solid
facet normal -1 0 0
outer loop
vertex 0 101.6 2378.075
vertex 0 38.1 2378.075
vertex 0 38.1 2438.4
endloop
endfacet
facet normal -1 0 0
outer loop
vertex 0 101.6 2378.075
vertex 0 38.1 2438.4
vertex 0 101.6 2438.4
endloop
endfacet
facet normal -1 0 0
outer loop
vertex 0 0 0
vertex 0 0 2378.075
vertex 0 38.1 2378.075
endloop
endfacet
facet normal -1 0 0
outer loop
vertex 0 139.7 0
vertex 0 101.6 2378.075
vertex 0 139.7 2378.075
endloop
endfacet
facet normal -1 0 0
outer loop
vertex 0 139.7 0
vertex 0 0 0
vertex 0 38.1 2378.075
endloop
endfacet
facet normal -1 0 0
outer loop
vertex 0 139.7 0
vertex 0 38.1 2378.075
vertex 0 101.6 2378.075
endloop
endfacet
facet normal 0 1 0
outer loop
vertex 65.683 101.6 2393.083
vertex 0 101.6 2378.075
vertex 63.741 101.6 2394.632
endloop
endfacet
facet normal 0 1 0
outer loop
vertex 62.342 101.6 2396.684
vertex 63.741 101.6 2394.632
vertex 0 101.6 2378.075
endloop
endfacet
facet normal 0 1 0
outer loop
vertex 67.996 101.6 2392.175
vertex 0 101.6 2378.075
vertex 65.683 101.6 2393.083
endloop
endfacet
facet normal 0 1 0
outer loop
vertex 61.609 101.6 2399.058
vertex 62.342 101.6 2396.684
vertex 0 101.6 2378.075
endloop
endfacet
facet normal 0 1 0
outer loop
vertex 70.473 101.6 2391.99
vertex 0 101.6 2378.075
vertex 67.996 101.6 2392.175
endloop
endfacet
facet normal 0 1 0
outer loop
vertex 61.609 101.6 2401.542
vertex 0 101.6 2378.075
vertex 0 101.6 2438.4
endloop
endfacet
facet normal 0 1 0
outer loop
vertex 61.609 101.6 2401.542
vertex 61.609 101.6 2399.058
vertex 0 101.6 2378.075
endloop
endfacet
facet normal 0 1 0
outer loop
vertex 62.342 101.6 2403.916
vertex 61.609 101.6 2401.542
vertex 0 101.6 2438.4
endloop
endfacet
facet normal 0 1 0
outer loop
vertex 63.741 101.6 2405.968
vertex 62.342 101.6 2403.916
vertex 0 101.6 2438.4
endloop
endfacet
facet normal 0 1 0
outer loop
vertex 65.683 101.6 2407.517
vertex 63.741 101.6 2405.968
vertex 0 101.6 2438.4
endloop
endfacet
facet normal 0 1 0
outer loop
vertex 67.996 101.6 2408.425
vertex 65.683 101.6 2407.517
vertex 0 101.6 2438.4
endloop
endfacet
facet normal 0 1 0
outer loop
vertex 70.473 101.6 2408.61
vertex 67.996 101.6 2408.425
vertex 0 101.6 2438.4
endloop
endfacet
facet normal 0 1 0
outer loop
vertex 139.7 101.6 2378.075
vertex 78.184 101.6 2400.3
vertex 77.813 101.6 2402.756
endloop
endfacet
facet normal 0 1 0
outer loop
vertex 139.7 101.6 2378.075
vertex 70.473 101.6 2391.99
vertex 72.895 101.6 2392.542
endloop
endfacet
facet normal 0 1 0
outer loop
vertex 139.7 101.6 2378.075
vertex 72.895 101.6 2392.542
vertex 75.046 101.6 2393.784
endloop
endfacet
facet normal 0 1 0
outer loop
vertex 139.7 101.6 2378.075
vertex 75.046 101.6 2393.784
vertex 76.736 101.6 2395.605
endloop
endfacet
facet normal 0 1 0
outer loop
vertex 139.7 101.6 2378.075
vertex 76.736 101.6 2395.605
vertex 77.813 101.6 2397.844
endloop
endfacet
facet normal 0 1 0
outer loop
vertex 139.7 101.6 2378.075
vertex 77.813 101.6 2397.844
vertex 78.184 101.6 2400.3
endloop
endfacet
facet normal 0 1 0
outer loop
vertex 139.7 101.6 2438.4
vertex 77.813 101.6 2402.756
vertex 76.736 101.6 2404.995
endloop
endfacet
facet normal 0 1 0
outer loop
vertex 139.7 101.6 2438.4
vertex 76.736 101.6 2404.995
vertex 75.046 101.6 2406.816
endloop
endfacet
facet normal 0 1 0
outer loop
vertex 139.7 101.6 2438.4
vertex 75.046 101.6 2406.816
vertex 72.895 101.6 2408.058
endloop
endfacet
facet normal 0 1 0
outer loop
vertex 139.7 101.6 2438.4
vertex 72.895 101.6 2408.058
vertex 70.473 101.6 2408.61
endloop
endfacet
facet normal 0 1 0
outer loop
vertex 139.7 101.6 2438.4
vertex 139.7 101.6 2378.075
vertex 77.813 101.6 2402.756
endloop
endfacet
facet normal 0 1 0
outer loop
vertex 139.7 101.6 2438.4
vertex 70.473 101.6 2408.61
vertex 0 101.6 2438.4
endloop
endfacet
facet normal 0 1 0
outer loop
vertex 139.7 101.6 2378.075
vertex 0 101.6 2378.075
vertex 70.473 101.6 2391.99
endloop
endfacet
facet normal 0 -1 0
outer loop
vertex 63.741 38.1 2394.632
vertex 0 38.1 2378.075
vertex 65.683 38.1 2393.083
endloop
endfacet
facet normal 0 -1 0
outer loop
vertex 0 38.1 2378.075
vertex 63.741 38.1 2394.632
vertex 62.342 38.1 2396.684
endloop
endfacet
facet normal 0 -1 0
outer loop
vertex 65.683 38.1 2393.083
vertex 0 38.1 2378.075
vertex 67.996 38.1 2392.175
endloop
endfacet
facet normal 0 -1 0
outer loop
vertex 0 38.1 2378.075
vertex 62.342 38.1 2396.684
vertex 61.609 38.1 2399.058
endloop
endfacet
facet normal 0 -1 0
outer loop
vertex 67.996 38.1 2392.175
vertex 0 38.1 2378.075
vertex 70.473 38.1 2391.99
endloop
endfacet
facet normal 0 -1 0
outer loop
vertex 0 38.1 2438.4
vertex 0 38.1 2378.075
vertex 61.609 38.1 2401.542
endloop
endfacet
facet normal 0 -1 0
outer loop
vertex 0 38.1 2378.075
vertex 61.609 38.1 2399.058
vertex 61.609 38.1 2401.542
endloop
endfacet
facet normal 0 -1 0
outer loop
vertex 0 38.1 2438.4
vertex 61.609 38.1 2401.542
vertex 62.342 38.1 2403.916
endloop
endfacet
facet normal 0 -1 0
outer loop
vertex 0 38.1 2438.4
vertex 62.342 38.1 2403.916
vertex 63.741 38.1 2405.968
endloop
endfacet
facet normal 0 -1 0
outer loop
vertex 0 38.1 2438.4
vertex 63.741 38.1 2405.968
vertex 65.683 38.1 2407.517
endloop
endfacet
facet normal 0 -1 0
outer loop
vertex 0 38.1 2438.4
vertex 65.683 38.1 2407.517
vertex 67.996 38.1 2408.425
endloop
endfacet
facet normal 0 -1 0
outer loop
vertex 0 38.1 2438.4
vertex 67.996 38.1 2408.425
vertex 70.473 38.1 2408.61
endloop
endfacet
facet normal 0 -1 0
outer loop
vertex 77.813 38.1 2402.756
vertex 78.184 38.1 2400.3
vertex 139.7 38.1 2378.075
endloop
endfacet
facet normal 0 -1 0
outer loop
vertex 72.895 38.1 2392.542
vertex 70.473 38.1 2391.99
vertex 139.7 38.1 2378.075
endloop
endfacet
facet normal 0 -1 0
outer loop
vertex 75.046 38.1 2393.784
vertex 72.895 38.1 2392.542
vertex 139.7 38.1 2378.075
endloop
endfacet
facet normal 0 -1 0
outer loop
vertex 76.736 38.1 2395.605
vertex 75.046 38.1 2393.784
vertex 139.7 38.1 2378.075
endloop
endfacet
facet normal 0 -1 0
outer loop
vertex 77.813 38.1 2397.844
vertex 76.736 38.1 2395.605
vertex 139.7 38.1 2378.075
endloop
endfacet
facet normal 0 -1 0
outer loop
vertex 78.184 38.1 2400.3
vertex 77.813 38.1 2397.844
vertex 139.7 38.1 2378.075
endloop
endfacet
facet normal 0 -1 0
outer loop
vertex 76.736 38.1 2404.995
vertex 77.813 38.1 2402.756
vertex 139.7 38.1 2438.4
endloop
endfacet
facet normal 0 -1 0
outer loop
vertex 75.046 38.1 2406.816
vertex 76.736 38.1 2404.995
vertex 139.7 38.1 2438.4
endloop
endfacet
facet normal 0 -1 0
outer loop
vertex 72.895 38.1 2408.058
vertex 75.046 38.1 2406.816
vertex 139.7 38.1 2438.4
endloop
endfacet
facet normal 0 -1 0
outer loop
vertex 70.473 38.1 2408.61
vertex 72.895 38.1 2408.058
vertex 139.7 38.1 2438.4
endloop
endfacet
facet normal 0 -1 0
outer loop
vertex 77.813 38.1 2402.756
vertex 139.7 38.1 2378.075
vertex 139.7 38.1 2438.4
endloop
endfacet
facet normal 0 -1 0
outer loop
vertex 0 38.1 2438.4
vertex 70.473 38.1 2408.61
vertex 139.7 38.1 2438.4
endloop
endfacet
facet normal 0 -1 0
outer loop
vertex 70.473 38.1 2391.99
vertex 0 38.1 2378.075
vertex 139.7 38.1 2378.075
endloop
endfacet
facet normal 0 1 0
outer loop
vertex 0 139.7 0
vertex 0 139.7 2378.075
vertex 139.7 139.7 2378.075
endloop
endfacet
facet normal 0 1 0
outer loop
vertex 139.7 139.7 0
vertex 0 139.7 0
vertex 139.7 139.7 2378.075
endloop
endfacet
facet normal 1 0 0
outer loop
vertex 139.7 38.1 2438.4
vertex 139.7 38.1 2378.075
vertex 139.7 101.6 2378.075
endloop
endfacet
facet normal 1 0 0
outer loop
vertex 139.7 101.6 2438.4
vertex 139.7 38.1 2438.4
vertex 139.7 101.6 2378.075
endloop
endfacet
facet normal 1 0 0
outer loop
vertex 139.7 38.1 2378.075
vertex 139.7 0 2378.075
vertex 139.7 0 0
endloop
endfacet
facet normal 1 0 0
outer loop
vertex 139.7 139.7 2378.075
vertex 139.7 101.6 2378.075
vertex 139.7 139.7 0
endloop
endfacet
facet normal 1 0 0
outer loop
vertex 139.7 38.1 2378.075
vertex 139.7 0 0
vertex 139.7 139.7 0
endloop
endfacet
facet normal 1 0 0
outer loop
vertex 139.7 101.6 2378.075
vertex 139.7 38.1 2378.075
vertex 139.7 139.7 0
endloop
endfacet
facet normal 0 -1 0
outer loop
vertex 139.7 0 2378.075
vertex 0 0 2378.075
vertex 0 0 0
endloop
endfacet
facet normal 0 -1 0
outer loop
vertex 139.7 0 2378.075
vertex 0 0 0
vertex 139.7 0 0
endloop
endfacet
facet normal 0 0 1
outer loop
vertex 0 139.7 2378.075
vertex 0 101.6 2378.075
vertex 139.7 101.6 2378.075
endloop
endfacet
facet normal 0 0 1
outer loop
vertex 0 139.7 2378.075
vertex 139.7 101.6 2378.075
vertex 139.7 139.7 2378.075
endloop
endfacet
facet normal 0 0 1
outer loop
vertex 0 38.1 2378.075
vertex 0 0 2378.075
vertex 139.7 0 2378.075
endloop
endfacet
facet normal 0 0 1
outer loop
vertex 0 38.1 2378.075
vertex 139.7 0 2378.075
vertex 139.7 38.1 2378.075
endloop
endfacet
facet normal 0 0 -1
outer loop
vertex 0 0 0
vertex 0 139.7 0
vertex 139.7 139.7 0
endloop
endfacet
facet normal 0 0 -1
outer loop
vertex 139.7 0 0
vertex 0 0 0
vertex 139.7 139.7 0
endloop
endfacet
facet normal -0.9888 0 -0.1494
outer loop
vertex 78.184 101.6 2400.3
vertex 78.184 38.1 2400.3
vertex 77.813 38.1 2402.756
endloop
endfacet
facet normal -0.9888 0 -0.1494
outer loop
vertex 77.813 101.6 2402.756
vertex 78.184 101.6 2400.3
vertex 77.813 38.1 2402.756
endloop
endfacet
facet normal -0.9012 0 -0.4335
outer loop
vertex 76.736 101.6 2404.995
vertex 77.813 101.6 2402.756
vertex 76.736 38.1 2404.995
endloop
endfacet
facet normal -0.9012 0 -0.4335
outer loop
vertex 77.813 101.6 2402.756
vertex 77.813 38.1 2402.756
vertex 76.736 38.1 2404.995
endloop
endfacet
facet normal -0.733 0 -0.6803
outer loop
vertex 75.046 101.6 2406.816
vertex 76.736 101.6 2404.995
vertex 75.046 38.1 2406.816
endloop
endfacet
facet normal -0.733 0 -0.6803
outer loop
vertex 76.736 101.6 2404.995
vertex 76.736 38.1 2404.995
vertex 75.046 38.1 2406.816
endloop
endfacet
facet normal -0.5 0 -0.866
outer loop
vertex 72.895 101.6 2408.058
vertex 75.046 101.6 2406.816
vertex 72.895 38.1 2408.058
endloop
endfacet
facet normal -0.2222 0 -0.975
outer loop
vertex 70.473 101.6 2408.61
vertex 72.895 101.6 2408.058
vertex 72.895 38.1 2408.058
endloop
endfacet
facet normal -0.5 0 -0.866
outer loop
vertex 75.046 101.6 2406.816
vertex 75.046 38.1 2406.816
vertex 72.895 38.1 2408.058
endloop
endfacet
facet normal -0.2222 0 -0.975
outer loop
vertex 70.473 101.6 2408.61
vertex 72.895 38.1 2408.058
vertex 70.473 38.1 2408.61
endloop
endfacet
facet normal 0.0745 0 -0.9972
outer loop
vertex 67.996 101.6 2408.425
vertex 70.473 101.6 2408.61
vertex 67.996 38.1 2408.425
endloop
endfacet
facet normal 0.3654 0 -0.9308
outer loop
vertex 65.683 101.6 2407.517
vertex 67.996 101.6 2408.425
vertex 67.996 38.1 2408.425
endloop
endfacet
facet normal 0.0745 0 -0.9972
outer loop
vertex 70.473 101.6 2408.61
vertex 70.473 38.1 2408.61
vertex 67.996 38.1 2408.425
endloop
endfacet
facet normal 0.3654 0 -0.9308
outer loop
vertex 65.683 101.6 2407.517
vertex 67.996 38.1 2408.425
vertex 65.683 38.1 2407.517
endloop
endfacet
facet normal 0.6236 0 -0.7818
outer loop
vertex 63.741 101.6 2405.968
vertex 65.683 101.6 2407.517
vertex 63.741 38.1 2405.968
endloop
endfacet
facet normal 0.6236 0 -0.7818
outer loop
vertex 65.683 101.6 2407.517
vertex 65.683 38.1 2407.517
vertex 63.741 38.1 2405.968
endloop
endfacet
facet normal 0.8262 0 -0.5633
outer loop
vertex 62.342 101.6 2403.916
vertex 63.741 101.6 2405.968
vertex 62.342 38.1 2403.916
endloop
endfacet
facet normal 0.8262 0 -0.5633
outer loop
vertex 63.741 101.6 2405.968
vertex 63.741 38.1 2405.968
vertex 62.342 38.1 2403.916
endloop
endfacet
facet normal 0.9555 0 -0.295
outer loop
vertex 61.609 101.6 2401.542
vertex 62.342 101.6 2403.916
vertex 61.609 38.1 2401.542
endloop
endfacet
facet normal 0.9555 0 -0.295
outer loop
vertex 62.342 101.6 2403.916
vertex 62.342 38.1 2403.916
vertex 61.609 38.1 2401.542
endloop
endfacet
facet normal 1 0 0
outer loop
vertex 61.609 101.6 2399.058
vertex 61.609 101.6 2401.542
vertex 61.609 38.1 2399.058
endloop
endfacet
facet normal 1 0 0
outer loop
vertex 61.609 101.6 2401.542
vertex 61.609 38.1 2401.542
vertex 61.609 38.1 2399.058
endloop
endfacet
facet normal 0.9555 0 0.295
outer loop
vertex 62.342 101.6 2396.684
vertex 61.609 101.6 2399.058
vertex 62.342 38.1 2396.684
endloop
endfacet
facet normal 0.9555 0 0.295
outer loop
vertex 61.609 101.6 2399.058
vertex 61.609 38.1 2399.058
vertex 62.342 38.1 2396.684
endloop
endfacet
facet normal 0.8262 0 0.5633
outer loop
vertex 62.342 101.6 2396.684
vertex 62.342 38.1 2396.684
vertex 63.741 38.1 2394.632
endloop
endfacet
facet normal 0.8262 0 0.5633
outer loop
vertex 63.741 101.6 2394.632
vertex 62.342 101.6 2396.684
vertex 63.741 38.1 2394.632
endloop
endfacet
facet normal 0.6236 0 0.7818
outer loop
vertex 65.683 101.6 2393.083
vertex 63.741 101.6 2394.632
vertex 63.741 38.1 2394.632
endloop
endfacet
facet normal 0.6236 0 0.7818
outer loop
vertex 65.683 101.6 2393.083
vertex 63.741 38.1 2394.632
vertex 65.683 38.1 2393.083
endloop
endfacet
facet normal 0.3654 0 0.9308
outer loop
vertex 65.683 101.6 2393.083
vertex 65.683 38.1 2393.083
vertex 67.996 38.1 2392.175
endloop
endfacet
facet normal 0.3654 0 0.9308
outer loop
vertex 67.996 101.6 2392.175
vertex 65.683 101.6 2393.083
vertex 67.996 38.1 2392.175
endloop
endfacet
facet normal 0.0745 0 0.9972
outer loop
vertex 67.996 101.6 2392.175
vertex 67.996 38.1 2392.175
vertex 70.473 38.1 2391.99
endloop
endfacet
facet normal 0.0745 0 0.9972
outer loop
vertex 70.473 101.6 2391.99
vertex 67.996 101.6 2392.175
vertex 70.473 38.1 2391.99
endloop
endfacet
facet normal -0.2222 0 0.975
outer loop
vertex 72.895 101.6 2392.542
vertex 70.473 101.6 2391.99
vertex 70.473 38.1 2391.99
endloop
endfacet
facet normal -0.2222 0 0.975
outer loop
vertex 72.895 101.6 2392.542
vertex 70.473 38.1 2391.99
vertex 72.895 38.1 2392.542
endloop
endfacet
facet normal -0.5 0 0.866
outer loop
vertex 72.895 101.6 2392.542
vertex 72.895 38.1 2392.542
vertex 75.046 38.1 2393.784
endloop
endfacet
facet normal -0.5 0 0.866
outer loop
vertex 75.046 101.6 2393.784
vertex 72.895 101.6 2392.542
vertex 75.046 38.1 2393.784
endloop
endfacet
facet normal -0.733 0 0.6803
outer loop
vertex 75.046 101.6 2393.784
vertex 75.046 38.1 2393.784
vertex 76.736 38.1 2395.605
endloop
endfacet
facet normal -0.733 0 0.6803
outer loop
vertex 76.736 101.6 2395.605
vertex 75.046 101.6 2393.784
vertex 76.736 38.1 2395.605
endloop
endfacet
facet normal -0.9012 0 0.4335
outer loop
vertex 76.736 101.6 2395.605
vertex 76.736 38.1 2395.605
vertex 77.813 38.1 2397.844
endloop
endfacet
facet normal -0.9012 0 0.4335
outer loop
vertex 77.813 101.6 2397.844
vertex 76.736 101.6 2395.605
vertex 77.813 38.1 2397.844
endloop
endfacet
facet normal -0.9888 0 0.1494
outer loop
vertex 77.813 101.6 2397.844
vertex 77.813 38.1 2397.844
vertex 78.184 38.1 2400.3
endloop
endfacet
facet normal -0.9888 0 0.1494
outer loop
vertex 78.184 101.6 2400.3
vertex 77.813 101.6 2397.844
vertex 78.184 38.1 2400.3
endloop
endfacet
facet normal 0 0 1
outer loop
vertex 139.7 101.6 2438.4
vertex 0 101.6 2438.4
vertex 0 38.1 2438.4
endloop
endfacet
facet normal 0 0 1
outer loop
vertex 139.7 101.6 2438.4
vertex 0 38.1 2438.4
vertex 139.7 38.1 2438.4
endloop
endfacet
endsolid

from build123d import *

# Parameters (mm, degrees)
F0_W     = 139.7
F0_H     = 139.7
F1_DEPTH = 2438.4
F2_W     = 38.1
F2_H     = 60.325
F3_DEPTH = 139.701
F5_D     = 16.66748


with BuildPart() as f1:
    # F0 (on Top) → F1 (new body)
    with BuildSketch(Plane.XY):
        with Locations((69.85, 69.85)):
            Rectangle(F0_W, F0_H)
    extrude(amount=F1_DEPTH)

    # F2 (on face) → F3 (cut, through all)
    with BuildSketch(Plane.YZ.offset(139.7)):
        with Locations((19.05, 2408.2375)):
            Rectangle(F2_W, F2_H)
        with Locations((120.65, 2408.2375)):
            Rectangle(F2_W, F2_H)
    extrude(amount=-F3_DEPTH, mode=Mode.SUBTRACT)

    # F5 (through all)
    with Locations(Plane(origin=(0, 139.7, 0), x_dir=(-1, 0, 0), z_dir=(0, 1, 0))):
        with Locations((-69.85, 2400.3)):
            Hole(F5_D / 2)


solid = f1.part
